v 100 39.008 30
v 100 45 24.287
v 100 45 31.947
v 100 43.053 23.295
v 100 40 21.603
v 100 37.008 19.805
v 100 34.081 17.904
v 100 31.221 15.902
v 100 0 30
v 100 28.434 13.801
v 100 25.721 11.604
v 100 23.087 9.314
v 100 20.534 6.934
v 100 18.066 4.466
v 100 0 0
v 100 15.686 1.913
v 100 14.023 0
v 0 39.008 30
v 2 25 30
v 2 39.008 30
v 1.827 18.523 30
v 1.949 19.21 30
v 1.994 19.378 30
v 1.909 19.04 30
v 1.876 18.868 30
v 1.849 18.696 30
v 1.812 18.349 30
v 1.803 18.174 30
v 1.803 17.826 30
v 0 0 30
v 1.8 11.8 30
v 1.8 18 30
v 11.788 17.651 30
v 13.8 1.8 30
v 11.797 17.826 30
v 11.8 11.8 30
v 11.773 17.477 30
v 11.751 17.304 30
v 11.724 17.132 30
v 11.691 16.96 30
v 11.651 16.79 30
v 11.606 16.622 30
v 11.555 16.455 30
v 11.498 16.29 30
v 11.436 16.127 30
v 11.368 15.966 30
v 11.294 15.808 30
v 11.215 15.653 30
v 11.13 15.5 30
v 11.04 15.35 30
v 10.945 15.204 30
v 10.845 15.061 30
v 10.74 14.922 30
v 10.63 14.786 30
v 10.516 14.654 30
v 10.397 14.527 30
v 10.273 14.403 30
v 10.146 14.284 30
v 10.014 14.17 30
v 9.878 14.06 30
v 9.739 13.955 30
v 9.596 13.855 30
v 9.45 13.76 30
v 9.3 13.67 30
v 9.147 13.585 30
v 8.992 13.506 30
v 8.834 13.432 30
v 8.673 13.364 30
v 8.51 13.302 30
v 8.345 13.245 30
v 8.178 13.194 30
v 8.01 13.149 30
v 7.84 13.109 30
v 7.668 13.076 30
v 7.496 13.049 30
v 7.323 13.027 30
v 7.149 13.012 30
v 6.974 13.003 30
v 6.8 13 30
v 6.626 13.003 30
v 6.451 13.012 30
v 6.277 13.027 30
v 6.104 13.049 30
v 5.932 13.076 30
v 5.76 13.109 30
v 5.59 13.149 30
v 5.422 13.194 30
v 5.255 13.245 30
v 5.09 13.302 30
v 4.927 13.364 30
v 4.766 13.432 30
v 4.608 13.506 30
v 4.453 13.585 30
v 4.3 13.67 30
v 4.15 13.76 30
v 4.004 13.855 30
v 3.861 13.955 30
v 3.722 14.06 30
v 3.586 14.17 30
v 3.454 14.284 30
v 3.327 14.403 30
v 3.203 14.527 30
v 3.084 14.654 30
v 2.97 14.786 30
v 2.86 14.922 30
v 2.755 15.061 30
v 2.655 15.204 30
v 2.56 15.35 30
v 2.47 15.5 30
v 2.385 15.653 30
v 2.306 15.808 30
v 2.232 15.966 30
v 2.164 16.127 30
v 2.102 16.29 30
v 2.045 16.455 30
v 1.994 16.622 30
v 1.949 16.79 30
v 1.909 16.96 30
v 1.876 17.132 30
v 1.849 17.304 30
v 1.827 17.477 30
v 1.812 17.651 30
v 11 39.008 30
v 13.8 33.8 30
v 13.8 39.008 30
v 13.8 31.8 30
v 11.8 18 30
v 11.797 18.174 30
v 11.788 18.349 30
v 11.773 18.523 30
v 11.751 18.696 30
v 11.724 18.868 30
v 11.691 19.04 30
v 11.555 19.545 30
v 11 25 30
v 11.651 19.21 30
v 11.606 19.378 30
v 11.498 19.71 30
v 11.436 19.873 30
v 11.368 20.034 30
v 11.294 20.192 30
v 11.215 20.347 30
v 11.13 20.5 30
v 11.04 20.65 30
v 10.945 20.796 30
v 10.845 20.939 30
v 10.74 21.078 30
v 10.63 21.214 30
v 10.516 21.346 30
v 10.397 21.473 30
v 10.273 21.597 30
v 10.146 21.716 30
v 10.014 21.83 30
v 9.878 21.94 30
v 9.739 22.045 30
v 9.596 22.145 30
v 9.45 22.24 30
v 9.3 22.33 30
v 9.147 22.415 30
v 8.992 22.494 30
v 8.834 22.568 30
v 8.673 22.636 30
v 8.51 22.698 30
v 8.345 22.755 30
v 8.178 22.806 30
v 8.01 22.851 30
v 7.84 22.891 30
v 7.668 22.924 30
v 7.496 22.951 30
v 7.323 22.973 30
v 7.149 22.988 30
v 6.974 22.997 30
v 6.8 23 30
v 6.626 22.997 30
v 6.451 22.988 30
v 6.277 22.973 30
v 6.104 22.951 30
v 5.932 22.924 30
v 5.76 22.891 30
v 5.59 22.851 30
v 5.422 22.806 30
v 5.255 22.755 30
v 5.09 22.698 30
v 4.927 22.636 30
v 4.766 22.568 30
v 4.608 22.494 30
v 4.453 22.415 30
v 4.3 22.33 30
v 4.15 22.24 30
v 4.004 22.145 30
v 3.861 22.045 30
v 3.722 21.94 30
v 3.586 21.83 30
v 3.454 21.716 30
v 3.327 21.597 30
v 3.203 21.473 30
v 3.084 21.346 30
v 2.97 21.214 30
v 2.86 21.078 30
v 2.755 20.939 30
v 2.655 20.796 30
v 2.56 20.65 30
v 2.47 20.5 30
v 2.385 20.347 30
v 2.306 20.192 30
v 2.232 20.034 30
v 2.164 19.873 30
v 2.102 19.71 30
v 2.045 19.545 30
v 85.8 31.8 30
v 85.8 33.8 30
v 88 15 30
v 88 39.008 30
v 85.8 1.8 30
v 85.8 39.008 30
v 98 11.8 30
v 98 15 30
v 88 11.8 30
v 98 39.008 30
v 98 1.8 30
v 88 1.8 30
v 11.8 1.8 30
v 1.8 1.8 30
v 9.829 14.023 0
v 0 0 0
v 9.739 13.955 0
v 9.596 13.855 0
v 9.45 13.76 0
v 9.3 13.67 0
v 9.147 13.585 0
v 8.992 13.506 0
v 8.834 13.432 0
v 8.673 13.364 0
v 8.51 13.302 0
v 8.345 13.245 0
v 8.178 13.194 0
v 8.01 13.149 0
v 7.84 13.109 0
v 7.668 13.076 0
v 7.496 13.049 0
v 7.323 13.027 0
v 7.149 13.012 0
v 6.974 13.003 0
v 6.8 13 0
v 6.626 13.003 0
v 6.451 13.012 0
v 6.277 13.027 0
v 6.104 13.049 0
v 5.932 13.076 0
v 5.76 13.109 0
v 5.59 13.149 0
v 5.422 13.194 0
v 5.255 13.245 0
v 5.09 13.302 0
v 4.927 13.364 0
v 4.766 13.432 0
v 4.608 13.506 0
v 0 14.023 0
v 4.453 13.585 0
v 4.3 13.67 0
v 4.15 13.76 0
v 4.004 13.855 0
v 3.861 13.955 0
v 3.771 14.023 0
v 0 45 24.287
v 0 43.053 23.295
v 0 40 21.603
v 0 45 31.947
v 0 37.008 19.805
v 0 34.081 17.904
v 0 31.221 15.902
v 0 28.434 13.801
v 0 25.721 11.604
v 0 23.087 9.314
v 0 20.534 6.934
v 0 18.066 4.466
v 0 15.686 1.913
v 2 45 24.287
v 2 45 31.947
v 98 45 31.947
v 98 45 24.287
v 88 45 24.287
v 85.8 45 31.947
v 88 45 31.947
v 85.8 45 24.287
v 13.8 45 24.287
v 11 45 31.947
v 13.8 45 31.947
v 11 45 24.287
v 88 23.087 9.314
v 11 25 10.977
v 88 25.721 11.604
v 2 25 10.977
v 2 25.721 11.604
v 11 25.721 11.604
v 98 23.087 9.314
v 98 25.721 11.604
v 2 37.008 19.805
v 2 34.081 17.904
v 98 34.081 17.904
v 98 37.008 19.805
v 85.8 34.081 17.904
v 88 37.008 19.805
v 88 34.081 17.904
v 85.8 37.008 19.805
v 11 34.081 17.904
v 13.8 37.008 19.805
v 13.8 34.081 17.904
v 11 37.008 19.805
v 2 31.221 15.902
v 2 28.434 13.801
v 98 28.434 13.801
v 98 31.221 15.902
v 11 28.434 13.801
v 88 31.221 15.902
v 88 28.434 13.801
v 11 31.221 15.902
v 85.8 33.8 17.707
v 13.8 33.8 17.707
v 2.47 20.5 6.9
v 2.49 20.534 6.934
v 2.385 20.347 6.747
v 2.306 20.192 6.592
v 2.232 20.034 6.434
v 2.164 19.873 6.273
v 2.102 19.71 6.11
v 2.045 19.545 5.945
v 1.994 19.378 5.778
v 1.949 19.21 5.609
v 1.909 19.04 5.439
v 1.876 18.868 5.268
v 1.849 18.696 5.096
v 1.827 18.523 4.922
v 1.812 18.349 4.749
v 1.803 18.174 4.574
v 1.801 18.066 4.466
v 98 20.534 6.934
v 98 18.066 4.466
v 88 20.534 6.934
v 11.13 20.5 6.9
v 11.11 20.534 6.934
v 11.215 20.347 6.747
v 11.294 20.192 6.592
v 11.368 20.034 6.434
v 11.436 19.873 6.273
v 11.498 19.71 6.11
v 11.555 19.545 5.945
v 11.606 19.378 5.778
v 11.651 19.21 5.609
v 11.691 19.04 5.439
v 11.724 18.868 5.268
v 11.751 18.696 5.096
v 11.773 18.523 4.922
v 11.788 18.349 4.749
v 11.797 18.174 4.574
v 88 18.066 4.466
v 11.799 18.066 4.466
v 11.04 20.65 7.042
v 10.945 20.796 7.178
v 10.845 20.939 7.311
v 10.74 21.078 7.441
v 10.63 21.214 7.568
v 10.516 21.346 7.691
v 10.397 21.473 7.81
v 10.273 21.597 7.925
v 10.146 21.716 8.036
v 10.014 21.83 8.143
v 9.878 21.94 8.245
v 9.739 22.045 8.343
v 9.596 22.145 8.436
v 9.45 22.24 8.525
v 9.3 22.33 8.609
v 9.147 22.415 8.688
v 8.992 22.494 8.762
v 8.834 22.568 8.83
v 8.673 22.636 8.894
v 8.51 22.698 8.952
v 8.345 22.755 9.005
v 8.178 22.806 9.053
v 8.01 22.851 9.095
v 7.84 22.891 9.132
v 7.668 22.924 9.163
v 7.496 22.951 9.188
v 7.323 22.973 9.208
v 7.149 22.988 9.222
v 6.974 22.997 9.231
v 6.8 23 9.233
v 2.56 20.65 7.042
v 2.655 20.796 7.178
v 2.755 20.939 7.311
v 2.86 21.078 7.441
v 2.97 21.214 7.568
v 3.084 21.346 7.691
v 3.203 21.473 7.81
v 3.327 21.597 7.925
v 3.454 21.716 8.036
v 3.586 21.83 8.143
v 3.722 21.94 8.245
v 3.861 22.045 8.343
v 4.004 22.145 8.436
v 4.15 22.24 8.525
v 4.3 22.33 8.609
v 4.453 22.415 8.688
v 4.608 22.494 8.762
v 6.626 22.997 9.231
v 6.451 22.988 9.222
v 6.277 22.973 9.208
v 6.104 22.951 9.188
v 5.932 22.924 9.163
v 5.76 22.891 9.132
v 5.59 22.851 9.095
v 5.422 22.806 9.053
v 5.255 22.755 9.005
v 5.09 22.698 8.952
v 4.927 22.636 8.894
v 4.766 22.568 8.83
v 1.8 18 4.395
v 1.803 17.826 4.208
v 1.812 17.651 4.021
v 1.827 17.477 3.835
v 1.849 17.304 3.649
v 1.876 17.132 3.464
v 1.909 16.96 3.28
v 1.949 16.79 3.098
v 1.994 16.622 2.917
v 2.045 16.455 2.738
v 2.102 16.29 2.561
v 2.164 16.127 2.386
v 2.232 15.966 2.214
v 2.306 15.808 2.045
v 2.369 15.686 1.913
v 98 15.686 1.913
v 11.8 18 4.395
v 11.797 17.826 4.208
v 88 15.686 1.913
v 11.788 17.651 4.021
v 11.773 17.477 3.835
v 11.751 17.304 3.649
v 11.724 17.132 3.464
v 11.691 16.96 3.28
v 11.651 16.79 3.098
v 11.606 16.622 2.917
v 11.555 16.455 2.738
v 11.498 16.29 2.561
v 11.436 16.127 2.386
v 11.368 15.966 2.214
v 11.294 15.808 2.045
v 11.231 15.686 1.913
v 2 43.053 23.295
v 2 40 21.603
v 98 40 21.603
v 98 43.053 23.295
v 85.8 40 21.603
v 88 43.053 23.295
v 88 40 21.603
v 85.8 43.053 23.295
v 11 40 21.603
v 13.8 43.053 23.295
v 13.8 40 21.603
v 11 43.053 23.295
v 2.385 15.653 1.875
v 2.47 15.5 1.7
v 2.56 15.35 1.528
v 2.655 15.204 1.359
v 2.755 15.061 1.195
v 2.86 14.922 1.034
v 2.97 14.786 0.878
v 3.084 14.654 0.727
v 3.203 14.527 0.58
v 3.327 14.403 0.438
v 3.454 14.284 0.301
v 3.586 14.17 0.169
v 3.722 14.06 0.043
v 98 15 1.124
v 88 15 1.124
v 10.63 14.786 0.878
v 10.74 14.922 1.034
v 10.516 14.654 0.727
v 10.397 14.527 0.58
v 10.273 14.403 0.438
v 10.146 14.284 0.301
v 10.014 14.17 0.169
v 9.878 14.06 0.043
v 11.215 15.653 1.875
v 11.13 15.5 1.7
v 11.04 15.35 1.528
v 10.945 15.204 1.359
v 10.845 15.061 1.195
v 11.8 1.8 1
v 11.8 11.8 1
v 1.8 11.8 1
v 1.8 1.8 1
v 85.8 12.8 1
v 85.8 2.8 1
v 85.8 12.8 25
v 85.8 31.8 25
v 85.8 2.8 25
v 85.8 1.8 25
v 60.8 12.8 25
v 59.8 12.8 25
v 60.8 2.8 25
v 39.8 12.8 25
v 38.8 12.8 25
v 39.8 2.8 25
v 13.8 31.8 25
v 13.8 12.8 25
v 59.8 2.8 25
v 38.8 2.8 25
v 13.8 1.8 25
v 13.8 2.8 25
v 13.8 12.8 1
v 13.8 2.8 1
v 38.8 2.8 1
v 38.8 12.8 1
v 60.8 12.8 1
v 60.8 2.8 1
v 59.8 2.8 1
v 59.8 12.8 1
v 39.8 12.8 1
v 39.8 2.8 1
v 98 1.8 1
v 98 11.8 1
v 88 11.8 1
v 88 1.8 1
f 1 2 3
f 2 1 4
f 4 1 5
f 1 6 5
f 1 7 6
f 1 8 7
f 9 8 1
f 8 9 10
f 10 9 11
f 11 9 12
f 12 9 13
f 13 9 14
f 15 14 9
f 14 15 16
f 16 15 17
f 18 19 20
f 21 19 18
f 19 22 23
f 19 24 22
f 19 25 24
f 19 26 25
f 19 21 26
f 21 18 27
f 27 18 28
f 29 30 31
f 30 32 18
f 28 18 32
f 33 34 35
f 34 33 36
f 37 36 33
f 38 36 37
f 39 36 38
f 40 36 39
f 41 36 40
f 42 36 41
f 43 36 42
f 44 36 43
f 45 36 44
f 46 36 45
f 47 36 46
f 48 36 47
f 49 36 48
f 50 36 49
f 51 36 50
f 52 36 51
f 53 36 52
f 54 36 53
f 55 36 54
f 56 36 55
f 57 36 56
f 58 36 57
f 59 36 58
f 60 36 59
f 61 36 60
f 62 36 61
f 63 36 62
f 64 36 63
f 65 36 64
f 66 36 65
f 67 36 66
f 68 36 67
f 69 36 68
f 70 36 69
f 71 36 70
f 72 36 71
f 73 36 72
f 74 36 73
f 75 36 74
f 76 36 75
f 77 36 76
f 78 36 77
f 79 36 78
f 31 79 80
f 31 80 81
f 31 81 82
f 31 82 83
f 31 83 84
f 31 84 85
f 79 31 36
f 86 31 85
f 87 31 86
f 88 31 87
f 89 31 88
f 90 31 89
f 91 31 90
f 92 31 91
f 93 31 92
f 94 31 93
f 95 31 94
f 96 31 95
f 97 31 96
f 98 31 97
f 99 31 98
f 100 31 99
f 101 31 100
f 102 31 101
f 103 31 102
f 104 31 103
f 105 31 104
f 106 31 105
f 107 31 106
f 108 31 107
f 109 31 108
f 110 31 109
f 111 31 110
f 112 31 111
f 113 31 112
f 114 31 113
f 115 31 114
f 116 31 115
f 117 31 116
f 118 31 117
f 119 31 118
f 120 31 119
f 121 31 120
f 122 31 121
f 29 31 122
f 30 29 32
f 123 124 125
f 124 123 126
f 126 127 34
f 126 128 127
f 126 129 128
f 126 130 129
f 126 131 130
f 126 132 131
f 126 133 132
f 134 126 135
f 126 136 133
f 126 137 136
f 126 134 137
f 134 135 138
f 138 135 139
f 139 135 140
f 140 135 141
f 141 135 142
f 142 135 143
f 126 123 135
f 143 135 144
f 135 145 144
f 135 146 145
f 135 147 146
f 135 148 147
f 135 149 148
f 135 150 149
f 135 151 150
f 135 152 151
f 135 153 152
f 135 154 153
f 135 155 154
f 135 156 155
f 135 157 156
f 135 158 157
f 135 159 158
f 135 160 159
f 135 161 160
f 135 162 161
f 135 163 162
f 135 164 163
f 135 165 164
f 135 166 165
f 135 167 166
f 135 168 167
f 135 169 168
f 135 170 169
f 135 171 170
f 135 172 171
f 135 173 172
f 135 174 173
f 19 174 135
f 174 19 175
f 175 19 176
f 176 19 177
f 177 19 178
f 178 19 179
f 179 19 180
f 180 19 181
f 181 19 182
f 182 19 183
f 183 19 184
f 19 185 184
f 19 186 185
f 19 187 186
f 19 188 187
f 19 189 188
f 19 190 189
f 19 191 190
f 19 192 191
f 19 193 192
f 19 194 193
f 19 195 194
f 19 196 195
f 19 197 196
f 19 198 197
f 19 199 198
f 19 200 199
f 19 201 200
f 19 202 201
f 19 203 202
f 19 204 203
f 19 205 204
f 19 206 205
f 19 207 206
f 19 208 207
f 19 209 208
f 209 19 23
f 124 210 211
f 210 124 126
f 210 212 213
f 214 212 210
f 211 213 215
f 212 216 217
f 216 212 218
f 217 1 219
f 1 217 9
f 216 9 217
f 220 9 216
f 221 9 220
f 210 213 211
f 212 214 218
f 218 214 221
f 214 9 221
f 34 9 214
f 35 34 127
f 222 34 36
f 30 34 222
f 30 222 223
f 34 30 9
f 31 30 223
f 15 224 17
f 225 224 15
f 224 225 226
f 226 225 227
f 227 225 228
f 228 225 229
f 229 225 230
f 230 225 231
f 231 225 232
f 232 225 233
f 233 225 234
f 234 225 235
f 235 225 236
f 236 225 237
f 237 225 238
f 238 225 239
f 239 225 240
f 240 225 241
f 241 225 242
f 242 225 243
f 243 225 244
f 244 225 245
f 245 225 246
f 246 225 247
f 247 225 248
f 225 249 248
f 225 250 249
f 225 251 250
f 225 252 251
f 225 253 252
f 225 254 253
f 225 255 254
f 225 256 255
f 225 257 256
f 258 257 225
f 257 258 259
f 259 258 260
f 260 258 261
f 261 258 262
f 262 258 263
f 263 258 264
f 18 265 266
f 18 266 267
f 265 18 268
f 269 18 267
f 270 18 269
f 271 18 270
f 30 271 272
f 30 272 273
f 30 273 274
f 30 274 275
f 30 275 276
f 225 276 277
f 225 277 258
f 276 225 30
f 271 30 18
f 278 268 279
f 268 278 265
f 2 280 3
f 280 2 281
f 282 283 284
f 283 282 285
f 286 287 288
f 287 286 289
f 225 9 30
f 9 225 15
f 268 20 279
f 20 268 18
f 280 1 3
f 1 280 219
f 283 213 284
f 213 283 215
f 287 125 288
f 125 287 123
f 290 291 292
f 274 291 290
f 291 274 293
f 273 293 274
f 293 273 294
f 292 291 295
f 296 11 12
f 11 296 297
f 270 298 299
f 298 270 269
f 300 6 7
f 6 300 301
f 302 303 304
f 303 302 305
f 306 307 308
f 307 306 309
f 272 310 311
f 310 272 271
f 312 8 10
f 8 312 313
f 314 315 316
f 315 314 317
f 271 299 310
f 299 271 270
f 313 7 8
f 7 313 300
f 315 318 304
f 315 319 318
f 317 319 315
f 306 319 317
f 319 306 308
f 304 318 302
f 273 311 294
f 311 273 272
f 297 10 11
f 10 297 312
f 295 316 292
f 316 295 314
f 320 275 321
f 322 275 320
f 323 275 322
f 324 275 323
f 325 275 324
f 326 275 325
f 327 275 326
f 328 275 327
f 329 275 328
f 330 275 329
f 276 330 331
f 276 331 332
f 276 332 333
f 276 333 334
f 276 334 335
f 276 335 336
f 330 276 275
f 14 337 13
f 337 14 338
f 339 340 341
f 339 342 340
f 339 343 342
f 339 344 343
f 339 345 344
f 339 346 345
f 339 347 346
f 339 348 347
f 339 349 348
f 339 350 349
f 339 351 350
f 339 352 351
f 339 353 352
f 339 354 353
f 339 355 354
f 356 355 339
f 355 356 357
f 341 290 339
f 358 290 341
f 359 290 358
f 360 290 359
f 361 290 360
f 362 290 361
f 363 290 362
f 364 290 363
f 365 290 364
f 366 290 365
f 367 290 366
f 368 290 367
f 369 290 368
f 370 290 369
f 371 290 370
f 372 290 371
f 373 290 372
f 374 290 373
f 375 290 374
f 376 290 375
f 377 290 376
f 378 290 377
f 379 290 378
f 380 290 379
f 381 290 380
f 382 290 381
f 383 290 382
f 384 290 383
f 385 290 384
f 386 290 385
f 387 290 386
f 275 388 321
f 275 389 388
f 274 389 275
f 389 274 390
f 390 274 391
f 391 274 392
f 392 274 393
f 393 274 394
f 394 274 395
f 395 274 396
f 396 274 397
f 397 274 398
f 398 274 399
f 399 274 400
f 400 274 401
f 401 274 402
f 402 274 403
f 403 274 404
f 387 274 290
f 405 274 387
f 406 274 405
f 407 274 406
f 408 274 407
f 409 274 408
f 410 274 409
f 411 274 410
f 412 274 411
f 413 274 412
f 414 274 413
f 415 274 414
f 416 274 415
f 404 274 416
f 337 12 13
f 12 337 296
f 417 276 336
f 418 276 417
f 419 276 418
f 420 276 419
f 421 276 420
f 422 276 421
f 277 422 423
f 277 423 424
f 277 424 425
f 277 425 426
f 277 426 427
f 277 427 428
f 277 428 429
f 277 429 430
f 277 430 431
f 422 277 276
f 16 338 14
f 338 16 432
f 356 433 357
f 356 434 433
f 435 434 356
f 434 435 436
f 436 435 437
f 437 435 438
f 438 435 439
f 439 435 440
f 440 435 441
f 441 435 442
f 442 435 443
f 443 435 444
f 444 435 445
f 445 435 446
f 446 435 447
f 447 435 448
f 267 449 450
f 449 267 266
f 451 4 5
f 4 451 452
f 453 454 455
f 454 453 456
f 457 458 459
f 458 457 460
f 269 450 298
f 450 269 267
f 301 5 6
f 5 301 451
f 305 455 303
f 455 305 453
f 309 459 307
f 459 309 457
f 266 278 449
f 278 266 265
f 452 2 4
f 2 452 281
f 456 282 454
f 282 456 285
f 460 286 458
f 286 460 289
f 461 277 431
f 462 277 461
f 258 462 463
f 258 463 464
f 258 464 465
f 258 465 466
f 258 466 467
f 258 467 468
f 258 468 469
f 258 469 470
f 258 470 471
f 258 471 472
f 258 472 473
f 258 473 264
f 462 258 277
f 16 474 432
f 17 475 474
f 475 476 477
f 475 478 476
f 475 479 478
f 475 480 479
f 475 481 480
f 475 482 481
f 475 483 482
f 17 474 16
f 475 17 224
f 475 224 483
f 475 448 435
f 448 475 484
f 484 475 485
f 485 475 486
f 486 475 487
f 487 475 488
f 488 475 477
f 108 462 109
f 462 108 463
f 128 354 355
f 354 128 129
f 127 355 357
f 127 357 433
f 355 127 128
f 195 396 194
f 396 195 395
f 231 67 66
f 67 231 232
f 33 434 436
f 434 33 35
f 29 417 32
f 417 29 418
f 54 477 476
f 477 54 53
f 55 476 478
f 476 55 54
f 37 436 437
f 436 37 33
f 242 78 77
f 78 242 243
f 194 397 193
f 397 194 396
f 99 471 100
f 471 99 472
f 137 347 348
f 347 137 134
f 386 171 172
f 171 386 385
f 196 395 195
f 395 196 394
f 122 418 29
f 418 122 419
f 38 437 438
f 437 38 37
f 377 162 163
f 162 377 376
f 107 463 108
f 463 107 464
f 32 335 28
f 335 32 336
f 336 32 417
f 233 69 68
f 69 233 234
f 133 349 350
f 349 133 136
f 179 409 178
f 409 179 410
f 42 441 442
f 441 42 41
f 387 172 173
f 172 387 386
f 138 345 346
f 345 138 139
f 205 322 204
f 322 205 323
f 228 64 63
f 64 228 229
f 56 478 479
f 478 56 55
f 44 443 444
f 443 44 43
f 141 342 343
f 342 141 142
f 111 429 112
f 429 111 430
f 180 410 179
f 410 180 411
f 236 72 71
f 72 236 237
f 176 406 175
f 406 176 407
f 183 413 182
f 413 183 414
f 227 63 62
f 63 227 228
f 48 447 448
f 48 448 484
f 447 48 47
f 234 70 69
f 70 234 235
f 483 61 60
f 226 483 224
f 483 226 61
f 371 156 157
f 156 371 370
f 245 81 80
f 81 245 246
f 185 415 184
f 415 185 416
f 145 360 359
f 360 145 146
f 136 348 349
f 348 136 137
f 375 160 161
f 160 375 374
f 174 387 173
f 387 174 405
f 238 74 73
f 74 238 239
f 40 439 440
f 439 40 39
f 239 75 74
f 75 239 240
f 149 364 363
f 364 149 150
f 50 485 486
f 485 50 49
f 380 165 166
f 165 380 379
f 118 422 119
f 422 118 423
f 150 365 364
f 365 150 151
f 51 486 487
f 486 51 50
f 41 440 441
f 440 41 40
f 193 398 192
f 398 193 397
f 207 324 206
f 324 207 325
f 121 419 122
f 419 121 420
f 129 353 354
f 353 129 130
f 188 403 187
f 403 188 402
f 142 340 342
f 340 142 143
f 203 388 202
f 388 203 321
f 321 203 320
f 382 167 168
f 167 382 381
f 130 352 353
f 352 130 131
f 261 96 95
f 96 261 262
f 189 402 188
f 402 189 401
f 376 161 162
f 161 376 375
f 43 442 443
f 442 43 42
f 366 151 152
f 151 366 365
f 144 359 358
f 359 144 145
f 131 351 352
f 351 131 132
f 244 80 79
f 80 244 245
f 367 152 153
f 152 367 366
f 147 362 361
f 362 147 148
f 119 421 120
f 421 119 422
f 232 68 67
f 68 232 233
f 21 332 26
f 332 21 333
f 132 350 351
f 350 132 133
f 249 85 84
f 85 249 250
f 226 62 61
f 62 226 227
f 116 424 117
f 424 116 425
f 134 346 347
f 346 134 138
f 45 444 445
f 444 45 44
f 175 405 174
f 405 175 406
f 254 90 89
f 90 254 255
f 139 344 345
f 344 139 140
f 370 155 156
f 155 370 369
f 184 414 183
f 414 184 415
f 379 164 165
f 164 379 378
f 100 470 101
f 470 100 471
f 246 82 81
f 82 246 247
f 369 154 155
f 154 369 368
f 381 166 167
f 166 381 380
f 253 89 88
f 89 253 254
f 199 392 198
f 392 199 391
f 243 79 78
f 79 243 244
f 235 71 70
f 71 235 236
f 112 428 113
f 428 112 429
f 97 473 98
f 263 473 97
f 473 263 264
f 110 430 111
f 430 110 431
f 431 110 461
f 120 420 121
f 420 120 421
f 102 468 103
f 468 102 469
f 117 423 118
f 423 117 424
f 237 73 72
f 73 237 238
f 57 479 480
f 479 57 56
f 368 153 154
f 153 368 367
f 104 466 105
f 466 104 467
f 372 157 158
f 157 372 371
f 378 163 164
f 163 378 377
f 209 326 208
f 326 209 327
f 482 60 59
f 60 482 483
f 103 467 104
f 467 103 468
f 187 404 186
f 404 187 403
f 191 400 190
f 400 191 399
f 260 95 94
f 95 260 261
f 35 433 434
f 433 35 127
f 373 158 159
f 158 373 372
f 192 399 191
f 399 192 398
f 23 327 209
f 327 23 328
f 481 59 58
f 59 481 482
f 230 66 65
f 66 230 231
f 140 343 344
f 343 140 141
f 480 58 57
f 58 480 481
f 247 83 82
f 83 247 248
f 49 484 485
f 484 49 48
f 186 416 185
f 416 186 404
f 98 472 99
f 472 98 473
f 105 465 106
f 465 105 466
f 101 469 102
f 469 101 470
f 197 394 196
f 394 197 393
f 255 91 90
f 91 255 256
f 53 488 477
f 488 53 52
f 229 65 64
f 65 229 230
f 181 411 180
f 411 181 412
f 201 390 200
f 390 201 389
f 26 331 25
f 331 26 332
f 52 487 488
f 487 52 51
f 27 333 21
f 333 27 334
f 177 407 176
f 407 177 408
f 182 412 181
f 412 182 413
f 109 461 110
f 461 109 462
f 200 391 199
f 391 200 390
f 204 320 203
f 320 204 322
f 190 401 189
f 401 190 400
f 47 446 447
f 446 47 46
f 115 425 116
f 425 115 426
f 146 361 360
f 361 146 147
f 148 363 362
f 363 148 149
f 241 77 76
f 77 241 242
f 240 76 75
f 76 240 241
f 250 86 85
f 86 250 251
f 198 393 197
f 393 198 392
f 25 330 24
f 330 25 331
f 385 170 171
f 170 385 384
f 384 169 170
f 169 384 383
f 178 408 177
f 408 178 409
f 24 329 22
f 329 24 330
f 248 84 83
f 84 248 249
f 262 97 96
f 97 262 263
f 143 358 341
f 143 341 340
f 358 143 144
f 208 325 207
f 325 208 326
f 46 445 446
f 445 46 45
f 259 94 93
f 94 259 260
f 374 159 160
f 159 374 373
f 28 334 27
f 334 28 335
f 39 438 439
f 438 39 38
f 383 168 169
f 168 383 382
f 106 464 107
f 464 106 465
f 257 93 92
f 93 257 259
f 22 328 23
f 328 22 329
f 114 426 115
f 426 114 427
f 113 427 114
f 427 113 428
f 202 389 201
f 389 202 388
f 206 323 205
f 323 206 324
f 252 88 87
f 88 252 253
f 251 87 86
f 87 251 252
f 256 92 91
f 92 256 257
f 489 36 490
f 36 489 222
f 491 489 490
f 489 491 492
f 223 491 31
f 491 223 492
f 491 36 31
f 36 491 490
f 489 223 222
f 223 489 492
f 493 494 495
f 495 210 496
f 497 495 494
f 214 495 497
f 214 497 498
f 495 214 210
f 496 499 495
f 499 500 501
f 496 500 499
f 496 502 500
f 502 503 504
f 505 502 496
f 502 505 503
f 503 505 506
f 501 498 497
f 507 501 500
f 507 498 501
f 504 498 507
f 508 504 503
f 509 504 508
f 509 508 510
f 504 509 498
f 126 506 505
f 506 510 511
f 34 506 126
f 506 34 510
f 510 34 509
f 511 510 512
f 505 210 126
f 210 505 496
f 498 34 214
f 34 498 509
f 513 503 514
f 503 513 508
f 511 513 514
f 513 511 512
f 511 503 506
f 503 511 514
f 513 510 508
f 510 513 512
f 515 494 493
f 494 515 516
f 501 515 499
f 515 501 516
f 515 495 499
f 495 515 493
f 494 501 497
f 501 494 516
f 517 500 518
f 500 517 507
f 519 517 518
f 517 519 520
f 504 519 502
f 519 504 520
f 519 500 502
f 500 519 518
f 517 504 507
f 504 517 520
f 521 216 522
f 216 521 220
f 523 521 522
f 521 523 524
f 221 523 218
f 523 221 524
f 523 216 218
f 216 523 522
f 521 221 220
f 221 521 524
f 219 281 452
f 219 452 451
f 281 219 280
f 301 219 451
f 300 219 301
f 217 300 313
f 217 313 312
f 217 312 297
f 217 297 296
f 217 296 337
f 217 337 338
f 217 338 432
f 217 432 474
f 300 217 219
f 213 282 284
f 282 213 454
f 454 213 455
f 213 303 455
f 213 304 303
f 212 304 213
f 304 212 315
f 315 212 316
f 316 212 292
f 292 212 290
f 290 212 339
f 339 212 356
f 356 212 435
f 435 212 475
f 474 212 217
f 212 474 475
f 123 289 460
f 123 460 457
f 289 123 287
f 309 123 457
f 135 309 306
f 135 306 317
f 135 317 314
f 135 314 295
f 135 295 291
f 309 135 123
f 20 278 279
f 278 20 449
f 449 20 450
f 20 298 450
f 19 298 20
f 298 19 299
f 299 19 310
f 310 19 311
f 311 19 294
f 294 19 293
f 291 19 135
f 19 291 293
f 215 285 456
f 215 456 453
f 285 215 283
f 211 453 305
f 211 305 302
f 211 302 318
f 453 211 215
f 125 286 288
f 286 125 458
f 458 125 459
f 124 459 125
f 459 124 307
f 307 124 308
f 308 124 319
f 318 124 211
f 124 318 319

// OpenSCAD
$fn = 180;


difference() {
    union() {
        cube([100,45,30]);
        translate([0,39.8,25])
            rotate([18,0,0])
            cube([100,8,5]);
    }
    translate([-1,45,-1])
        cube([102,45,50]);
    translate([-10,90,-65])
        rotate([0,90,0])
            cylinder(h=150, d=200);
    translate([6.8,18,-1])
        cylinder(h=50,d=10);
    translate([1.8,1.8,1])
        cube([10, 10, 50]);
    translate([13.8,1.8,25])
        cube([72, 30, 50]);
        
    translate([13.8,2.8,1])
        cube([25, 10, 50]);
    translate([60.8,2.8,1])
        cube([25, 10, 50]);
    translate([39.8,2.8,1])
        cube([20, 10, 50]);
        
    translate([88,1.8,1])
        cube([10, 10, 50]);
    translate([88,15,-1])
        cube([10, 50, 50]);
    translate([2,25,-1])
        cube([9, 50, 50]);
    translate([13.8,33.8,-1])
        cube([72, 30, 50]);
}
